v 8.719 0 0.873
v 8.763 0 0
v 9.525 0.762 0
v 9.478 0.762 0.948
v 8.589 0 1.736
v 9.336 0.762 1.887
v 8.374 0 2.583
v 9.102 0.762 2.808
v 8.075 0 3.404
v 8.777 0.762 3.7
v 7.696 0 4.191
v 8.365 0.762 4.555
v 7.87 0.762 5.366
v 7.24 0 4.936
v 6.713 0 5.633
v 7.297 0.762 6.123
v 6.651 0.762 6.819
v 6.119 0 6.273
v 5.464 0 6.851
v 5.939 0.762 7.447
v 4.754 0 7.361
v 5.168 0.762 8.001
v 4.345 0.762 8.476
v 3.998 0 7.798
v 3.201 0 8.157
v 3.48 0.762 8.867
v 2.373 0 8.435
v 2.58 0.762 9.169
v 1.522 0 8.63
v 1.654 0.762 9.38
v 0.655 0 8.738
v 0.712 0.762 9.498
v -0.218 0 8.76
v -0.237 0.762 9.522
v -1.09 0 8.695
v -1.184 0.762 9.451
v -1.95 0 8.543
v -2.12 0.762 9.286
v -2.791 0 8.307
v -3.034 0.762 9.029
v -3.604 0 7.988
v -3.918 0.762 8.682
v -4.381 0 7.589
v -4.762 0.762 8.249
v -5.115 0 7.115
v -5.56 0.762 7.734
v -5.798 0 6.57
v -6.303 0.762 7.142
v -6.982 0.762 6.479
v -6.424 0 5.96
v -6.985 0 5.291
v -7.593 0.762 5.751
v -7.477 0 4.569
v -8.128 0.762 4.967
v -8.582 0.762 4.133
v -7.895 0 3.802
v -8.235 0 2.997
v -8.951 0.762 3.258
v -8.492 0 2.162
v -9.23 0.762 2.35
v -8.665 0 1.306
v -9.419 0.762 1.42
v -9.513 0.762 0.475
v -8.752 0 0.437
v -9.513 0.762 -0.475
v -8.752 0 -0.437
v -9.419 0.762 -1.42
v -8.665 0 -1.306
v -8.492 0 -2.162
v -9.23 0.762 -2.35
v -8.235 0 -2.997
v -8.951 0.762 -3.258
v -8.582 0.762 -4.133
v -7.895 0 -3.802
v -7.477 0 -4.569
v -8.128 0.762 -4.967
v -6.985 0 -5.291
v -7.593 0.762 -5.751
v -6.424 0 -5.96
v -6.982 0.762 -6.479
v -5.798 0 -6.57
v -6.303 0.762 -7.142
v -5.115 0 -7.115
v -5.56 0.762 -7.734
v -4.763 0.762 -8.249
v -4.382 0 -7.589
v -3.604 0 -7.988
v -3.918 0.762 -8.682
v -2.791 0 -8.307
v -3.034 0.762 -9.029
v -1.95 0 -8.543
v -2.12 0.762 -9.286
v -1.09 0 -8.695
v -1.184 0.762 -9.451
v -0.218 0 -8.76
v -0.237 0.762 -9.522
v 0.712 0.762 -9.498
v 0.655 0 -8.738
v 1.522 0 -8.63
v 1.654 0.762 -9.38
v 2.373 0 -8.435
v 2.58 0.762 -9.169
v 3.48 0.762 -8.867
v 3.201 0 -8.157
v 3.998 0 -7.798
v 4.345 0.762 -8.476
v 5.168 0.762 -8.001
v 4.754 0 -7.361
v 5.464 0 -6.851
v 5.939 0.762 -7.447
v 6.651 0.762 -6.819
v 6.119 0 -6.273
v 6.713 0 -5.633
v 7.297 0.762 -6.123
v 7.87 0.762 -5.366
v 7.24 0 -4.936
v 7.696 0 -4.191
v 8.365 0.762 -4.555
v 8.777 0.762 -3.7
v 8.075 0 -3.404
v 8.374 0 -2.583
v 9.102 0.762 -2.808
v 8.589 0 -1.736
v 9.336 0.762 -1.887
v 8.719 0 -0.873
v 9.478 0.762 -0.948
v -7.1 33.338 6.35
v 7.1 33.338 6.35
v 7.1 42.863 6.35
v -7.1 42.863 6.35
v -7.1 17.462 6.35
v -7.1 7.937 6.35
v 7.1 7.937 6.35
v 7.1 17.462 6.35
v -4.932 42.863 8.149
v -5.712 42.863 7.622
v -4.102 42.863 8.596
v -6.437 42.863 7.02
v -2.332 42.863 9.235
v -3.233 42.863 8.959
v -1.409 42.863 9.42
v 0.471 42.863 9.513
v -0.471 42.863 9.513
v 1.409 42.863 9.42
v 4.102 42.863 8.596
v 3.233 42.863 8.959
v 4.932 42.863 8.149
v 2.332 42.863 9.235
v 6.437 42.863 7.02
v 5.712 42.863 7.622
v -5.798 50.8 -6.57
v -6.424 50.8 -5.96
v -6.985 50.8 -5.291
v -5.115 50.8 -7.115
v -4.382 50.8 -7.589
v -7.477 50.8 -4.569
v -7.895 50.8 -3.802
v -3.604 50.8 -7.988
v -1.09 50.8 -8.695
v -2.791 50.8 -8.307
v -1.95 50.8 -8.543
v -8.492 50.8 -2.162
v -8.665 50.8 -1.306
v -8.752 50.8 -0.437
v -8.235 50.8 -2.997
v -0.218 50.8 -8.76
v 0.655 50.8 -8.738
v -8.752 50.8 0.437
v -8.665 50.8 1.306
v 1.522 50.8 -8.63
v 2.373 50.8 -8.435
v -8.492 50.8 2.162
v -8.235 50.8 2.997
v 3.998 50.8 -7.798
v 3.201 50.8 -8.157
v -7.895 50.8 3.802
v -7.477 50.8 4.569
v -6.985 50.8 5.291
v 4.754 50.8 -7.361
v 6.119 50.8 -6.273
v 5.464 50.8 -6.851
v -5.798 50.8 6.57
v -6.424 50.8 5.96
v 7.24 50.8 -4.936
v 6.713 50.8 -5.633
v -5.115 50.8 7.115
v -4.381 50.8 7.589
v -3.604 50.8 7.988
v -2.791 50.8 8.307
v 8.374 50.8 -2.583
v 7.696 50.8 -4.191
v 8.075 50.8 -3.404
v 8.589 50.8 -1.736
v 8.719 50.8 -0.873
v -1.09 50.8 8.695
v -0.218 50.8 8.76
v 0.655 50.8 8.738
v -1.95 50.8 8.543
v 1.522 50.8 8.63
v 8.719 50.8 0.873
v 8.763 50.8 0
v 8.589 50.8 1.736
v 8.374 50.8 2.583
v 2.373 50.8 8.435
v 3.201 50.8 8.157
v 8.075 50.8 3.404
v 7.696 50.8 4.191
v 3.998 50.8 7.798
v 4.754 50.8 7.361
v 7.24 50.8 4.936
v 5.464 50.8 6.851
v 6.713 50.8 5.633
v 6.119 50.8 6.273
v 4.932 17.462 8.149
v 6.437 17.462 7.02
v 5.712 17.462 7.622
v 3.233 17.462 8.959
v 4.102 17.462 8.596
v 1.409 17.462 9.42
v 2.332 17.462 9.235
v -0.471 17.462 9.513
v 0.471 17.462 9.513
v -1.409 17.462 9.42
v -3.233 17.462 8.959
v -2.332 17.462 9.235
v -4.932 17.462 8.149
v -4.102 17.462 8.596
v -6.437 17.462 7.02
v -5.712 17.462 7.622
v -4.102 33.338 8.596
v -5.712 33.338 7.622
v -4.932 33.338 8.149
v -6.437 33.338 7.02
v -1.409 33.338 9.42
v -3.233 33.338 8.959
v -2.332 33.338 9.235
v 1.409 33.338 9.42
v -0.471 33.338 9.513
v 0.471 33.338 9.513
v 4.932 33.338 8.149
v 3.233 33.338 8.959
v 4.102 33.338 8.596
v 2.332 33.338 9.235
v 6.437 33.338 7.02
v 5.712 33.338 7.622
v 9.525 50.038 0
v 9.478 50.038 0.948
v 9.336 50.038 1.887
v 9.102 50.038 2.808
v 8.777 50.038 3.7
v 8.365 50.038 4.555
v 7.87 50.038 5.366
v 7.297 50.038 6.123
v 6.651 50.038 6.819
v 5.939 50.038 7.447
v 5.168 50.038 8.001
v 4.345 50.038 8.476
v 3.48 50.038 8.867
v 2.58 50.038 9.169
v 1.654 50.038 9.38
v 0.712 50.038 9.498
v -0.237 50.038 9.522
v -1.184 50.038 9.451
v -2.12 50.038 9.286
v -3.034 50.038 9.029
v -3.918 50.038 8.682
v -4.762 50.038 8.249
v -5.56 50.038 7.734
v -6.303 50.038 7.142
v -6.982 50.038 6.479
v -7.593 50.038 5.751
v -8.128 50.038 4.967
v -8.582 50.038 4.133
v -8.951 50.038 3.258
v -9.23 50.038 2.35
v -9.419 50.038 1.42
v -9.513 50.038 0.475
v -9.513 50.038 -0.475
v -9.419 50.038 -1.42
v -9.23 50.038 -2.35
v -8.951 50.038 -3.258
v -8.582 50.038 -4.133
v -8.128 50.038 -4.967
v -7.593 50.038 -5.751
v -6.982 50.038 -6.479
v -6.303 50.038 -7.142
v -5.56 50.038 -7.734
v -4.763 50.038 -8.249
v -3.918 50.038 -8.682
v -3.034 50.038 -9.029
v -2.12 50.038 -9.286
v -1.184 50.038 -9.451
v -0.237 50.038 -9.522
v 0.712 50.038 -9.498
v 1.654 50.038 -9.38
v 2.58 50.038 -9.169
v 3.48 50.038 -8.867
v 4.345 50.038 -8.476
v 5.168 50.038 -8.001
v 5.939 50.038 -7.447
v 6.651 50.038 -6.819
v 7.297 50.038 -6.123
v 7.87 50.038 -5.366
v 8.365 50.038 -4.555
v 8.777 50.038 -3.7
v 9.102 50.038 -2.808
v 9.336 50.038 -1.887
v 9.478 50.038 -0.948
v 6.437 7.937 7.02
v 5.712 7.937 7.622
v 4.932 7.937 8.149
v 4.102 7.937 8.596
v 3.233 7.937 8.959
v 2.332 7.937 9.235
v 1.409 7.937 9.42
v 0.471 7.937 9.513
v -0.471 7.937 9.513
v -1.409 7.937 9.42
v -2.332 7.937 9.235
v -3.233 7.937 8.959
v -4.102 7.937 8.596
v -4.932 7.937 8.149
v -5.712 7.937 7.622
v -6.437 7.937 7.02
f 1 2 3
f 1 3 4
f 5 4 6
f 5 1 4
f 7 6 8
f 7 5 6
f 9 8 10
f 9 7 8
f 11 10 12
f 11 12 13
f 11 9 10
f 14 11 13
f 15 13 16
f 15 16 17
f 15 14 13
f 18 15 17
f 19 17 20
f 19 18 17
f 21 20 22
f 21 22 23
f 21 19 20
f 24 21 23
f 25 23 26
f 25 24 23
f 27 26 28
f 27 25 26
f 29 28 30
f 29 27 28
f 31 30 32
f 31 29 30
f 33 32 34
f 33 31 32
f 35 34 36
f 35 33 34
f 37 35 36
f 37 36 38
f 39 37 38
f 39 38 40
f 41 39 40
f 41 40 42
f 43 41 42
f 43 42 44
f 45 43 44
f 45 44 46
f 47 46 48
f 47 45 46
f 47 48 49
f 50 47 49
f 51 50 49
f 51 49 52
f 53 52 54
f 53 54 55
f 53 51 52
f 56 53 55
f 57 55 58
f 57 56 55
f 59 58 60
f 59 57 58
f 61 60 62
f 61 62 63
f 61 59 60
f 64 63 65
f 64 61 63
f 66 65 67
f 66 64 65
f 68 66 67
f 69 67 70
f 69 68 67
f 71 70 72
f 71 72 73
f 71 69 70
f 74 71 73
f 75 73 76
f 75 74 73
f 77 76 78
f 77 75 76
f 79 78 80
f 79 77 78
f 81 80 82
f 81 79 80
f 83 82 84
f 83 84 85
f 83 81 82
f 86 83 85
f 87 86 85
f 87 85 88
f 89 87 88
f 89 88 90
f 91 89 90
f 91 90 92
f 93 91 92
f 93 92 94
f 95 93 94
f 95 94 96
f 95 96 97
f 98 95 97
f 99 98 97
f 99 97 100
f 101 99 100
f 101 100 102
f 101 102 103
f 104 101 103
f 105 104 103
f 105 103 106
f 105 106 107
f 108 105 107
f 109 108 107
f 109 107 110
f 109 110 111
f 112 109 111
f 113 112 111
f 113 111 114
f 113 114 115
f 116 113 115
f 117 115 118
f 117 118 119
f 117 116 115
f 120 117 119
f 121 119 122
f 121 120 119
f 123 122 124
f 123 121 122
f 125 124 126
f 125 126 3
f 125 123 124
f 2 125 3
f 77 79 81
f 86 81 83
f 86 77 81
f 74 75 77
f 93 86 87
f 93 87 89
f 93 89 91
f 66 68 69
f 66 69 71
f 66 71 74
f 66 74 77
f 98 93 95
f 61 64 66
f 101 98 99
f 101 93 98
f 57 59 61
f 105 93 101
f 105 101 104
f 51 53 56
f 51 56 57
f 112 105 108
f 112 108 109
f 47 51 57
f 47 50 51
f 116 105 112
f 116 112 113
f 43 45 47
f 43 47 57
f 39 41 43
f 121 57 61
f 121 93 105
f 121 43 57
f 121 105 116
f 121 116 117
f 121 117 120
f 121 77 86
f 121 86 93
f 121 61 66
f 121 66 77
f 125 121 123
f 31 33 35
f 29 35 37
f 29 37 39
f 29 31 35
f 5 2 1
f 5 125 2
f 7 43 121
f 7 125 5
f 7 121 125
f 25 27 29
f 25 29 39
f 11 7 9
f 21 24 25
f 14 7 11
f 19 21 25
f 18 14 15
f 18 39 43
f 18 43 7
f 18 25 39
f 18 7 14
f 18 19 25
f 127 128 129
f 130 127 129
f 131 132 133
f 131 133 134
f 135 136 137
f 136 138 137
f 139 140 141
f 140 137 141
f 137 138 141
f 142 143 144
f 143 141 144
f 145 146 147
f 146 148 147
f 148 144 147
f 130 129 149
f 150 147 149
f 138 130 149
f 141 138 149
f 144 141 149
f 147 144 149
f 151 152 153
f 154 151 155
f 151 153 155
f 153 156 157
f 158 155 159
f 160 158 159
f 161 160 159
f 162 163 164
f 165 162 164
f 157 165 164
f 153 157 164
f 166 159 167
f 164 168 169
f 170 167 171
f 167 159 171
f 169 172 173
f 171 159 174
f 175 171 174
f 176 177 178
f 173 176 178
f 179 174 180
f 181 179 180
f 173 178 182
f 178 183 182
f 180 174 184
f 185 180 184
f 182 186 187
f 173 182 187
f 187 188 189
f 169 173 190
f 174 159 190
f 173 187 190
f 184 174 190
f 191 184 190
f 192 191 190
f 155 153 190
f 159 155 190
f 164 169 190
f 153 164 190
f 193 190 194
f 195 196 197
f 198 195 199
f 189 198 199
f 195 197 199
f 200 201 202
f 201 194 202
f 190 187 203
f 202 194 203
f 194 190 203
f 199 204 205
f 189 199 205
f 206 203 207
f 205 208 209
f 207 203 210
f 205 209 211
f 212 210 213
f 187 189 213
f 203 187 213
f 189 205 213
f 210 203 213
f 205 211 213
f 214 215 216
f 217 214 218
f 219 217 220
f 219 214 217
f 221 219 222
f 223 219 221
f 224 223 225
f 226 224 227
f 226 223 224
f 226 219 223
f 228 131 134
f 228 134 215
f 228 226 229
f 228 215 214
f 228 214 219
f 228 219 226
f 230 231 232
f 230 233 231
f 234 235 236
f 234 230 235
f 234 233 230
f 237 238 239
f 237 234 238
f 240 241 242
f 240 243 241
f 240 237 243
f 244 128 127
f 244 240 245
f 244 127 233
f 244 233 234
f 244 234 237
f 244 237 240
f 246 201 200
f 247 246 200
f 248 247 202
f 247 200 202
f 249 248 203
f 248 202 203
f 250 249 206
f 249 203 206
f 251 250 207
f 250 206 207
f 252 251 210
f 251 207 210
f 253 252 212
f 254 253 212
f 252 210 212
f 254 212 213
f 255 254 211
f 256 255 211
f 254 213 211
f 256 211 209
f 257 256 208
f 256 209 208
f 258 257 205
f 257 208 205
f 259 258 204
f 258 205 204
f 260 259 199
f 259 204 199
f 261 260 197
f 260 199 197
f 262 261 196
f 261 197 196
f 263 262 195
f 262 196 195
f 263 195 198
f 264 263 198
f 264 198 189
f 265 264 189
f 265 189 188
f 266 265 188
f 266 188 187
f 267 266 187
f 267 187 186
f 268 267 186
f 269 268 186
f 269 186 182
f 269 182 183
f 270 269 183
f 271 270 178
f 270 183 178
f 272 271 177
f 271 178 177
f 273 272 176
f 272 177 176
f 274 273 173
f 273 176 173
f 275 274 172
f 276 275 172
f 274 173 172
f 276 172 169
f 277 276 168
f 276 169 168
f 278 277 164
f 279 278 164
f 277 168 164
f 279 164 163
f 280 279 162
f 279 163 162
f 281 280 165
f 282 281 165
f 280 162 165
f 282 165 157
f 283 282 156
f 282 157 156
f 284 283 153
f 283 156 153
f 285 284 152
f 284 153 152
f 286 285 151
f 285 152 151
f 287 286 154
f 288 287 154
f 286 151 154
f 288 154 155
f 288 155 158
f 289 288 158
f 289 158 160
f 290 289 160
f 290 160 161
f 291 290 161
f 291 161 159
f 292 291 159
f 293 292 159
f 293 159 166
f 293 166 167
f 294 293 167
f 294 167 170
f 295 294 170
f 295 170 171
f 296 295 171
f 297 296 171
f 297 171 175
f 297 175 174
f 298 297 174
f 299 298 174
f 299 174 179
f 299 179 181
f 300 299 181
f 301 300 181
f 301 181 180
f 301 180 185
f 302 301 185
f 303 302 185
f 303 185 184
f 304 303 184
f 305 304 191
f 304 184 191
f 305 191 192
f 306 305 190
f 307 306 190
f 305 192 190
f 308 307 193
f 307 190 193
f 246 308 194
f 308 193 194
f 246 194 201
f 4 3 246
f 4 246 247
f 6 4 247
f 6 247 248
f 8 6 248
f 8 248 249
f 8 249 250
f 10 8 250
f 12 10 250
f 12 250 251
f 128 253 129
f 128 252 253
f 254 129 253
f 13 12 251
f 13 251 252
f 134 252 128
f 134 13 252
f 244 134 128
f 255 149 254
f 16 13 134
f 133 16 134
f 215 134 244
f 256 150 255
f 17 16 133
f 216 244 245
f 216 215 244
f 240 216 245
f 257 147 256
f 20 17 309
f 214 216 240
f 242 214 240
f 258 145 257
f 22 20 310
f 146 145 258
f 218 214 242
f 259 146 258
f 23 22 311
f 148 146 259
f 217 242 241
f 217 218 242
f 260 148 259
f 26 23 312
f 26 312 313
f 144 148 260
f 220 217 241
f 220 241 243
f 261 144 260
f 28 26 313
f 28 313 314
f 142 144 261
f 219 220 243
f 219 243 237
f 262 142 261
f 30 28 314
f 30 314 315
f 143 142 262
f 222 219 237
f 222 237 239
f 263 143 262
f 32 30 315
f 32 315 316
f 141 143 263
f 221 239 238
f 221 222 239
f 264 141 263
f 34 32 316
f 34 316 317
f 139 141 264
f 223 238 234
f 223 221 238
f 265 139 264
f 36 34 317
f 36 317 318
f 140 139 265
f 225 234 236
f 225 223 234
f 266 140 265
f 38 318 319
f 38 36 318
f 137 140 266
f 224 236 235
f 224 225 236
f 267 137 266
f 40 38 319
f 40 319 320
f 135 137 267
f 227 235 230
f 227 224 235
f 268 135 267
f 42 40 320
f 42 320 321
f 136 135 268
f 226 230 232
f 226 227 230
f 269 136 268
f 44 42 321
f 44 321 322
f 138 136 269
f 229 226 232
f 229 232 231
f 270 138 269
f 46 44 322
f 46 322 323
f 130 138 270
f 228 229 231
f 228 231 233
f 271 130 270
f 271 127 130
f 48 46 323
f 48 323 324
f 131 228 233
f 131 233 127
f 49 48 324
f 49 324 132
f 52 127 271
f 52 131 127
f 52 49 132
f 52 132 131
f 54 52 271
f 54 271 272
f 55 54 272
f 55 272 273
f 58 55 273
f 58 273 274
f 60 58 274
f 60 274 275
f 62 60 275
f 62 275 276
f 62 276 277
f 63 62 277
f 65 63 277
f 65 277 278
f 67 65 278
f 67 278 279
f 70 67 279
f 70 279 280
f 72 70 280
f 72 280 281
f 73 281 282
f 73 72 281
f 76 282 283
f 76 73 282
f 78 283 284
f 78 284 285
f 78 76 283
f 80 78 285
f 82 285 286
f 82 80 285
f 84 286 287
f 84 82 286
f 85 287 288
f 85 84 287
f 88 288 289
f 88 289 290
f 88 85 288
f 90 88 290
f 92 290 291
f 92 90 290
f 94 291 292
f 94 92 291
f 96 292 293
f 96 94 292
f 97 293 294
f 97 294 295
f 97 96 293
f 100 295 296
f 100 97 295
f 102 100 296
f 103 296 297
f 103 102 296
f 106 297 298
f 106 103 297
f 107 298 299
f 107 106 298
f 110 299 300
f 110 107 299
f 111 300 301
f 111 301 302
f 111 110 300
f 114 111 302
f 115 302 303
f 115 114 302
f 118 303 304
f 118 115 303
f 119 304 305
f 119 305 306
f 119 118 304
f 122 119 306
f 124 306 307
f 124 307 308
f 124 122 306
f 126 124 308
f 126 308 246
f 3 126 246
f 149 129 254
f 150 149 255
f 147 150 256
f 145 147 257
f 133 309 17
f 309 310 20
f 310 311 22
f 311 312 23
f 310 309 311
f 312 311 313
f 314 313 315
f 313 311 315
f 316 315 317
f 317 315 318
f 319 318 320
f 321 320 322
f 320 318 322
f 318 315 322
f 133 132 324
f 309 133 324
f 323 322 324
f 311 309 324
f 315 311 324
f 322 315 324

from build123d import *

# Parameters (mm, degrees)
F0_R     = 9.525
F1_DEPTH = 50.8
F2_SIZE  = 0.762
F3_W     = 9.525
F3_H     = 5.747142
F4_DEPTH = 12.7


with BuildPart() as f1:
    # F0 (on Front) → F1 (new body)
    with BuildSketch(Plane.XZ):
        Circle(F0_R)
    extrude(amount=-F1_DEPTH)

    # F2
    f2_edges = [f1.edges().sort_by_distance(p)[0] for p in [
        (-9.525, 0, 0),
        (-9.525, 50.8, 0),
    ]]
    chamfer(f2_edges, length=F2_SIZE)

    # F3 (on Right) → F4 (cut, symmetric)
    with BuildSketch(Plane.YZ):
        with Locations((12.7, 9.223571)):
            Rectangle(F3_W, F3_H)
        with Locations((38.1, 9.223571)):
            Rectangle(F3_W, F3_H)
    extrude(amount=F4_DEPTH, both=True, mode=Mode.SUBTRACT)


solid = f1.part
